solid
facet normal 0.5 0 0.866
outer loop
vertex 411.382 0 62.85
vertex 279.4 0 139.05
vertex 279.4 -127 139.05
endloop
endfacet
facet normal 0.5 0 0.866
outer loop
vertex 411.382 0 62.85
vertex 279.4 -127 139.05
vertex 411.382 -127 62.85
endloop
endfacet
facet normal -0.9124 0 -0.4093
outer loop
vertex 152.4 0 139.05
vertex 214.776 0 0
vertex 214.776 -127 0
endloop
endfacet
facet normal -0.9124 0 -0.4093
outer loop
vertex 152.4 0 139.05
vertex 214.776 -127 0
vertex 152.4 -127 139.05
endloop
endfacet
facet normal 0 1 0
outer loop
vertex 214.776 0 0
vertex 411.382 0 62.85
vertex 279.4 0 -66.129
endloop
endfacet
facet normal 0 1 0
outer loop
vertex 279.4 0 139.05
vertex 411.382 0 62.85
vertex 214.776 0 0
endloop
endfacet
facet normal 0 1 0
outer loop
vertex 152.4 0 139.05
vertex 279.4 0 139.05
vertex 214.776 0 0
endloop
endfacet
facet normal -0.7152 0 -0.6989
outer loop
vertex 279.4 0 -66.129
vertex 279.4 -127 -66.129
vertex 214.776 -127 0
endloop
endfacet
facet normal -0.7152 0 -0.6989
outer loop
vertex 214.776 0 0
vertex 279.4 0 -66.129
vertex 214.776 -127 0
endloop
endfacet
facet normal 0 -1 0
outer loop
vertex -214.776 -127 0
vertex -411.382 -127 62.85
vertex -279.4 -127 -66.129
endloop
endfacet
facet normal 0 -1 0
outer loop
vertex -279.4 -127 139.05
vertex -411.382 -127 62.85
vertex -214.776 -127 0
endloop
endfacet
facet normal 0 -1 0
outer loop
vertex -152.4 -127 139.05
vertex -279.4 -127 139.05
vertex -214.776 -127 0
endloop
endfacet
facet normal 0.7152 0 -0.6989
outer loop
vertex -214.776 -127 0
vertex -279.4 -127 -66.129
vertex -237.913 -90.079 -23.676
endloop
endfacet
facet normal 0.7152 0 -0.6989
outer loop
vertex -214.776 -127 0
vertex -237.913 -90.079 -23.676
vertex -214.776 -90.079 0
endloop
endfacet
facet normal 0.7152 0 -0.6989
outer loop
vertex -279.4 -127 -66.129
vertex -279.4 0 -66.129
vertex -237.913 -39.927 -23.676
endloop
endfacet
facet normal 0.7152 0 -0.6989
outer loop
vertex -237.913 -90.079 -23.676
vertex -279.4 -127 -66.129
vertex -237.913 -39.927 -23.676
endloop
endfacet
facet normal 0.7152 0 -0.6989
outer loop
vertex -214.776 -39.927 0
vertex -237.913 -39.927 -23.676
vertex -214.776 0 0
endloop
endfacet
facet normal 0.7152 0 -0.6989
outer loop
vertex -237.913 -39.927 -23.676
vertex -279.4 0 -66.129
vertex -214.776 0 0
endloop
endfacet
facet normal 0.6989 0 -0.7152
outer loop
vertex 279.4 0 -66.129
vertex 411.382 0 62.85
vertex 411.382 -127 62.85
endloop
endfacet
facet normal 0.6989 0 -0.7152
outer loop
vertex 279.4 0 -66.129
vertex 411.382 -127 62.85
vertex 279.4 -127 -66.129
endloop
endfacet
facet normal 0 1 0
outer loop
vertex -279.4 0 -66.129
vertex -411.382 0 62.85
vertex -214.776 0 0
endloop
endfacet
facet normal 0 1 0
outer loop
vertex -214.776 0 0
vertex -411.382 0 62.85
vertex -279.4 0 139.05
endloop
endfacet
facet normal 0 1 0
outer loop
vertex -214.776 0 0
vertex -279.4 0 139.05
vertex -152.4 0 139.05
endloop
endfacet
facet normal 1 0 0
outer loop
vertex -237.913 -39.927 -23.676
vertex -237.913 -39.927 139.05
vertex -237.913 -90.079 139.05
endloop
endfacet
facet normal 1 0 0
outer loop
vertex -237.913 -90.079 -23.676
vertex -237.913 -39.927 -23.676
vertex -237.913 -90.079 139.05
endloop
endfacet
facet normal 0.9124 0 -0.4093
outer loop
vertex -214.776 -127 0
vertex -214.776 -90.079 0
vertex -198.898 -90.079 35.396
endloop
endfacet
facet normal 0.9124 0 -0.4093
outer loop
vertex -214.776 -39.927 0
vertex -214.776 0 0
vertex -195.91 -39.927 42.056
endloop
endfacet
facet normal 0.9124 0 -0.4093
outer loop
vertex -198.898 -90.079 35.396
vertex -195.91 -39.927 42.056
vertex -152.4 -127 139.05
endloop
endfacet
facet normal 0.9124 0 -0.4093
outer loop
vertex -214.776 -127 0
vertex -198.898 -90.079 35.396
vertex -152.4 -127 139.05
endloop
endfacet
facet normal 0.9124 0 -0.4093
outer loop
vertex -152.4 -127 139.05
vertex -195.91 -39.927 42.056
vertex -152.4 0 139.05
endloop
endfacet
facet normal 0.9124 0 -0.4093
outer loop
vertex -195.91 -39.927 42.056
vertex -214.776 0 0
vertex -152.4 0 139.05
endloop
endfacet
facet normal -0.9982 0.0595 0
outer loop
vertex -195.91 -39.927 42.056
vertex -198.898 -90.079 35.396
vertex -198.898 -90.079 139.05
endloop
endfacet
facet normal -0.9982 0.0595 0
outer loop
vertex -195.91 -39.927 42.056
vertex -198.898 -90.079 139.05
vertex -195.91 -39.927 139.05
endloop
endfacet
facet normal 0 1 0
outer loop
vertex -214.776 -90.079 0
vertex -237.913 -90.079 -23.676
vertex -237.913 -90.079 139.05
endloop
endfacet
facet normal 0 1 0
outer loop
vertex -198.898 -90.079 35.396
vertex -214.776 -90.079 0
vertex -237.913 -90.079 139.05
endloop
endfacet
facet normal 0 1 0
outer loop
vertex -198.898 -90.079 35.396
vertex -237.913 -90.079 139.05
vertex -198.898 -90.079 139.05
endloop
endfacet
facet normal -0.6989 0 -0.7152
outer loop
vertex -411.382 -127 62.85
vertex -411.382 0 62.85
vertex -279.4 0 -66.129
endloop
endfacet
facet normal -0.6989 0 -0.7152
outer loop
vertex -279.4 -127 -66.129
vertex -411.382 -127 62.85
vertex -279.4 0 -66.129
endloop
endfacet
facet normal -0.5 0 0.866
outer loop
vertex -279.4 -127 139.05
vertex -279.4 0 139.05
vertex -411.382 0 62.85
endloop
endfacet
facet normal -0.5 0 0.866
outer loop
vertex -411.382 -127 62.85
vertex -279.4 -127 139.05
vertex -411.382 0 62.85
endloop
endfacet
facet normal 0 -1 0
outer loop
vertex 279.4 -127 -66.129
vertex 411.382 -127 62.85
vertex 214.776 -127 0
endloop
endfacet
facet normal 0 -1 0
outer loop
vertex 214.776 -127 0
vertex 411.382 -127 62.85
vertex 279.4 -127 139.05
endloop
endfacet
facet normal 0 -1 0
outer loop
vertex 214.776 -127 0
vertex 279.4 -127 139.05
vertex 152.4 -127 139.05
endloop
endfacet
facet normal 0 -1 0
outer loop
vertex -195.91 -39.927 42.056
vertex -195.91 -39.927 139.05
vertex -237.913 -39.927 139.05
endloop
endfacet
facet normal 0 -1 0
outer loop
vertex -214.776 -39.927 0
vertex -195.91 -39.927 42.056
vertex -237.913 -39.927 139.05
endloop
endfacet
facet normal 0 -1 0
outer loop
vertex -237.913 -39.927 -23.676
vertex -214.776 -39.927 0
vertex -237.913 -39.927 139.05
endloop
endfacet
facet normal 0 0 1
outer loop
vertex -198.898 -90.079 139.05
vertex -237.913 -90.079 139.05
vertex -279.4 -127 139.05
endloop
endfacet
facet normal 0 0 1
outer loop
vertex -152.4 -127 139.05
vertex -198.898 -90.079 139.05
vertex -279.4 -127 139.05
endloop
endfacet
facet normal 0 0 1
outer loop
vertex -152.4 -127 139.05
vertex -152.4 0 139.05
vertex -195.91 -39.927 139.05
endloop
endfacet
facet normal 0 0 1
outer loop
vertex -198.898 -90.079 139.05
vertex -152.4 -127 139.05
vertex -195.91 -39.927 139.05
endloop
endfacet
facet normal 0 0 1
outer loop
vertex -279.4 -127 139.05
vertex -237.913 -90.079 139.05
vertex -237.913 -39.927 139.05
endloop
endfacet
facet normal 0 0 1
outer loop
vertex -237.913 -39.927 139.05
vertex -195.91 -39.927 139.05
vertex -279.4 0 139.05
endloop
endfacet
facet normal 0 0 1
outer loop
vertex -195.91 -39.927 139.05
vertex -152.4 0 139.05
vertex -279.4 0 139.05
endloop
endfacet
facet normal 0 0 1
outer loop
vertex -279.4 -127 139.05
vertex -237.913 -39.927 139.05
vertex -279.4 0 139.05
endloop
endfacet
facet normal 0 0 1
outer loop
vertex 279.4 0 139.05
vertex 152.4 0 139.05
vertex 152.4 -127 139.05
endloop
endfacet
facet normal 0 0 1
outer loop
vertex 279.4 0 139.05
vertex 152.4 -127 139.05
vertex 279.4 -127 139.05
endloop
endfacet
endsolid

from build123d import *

# Parameters (mm, degrees)
F1_DEPTH = 127
F4_DEPTH = 205.1801337074


with BuildPart() as f1:
    # F0 (on Front) → F1 (new body)
    with BuildSketch(Plane.XZ):
        Polygon((-214.7759297475, 0), (-152.4, 139.050362776), (-279.4, 139.050362776), (-411.3822715367, 62.850362776), (-279.4, -66.1287709315), align=None)
    extrude(amount=F1_DEPTH)


with BuildPart() as f3_1:
    # F3: instance of F1
    add(f1.part.mirror(Plane.YZ))


with BuildPart() as f1_1:
    add(f1.part)

    # F2 (on face) → F4 (cut, through all)
    with BuildSketch(Plane.XY.offset(139.050362776)):
        Polygon((-198.8979130983, -90.0793522596), (-195.9102451801, -39.9265550077), (-237.9128336906, -39.9265550077), (-237.9128336906, -90.0793522596), align=None)
    extrude(amount=-F4_DEPTH, mode=Mode.SUBTRACT)


solid = Compound([f3_1.part, f1_1.part])
